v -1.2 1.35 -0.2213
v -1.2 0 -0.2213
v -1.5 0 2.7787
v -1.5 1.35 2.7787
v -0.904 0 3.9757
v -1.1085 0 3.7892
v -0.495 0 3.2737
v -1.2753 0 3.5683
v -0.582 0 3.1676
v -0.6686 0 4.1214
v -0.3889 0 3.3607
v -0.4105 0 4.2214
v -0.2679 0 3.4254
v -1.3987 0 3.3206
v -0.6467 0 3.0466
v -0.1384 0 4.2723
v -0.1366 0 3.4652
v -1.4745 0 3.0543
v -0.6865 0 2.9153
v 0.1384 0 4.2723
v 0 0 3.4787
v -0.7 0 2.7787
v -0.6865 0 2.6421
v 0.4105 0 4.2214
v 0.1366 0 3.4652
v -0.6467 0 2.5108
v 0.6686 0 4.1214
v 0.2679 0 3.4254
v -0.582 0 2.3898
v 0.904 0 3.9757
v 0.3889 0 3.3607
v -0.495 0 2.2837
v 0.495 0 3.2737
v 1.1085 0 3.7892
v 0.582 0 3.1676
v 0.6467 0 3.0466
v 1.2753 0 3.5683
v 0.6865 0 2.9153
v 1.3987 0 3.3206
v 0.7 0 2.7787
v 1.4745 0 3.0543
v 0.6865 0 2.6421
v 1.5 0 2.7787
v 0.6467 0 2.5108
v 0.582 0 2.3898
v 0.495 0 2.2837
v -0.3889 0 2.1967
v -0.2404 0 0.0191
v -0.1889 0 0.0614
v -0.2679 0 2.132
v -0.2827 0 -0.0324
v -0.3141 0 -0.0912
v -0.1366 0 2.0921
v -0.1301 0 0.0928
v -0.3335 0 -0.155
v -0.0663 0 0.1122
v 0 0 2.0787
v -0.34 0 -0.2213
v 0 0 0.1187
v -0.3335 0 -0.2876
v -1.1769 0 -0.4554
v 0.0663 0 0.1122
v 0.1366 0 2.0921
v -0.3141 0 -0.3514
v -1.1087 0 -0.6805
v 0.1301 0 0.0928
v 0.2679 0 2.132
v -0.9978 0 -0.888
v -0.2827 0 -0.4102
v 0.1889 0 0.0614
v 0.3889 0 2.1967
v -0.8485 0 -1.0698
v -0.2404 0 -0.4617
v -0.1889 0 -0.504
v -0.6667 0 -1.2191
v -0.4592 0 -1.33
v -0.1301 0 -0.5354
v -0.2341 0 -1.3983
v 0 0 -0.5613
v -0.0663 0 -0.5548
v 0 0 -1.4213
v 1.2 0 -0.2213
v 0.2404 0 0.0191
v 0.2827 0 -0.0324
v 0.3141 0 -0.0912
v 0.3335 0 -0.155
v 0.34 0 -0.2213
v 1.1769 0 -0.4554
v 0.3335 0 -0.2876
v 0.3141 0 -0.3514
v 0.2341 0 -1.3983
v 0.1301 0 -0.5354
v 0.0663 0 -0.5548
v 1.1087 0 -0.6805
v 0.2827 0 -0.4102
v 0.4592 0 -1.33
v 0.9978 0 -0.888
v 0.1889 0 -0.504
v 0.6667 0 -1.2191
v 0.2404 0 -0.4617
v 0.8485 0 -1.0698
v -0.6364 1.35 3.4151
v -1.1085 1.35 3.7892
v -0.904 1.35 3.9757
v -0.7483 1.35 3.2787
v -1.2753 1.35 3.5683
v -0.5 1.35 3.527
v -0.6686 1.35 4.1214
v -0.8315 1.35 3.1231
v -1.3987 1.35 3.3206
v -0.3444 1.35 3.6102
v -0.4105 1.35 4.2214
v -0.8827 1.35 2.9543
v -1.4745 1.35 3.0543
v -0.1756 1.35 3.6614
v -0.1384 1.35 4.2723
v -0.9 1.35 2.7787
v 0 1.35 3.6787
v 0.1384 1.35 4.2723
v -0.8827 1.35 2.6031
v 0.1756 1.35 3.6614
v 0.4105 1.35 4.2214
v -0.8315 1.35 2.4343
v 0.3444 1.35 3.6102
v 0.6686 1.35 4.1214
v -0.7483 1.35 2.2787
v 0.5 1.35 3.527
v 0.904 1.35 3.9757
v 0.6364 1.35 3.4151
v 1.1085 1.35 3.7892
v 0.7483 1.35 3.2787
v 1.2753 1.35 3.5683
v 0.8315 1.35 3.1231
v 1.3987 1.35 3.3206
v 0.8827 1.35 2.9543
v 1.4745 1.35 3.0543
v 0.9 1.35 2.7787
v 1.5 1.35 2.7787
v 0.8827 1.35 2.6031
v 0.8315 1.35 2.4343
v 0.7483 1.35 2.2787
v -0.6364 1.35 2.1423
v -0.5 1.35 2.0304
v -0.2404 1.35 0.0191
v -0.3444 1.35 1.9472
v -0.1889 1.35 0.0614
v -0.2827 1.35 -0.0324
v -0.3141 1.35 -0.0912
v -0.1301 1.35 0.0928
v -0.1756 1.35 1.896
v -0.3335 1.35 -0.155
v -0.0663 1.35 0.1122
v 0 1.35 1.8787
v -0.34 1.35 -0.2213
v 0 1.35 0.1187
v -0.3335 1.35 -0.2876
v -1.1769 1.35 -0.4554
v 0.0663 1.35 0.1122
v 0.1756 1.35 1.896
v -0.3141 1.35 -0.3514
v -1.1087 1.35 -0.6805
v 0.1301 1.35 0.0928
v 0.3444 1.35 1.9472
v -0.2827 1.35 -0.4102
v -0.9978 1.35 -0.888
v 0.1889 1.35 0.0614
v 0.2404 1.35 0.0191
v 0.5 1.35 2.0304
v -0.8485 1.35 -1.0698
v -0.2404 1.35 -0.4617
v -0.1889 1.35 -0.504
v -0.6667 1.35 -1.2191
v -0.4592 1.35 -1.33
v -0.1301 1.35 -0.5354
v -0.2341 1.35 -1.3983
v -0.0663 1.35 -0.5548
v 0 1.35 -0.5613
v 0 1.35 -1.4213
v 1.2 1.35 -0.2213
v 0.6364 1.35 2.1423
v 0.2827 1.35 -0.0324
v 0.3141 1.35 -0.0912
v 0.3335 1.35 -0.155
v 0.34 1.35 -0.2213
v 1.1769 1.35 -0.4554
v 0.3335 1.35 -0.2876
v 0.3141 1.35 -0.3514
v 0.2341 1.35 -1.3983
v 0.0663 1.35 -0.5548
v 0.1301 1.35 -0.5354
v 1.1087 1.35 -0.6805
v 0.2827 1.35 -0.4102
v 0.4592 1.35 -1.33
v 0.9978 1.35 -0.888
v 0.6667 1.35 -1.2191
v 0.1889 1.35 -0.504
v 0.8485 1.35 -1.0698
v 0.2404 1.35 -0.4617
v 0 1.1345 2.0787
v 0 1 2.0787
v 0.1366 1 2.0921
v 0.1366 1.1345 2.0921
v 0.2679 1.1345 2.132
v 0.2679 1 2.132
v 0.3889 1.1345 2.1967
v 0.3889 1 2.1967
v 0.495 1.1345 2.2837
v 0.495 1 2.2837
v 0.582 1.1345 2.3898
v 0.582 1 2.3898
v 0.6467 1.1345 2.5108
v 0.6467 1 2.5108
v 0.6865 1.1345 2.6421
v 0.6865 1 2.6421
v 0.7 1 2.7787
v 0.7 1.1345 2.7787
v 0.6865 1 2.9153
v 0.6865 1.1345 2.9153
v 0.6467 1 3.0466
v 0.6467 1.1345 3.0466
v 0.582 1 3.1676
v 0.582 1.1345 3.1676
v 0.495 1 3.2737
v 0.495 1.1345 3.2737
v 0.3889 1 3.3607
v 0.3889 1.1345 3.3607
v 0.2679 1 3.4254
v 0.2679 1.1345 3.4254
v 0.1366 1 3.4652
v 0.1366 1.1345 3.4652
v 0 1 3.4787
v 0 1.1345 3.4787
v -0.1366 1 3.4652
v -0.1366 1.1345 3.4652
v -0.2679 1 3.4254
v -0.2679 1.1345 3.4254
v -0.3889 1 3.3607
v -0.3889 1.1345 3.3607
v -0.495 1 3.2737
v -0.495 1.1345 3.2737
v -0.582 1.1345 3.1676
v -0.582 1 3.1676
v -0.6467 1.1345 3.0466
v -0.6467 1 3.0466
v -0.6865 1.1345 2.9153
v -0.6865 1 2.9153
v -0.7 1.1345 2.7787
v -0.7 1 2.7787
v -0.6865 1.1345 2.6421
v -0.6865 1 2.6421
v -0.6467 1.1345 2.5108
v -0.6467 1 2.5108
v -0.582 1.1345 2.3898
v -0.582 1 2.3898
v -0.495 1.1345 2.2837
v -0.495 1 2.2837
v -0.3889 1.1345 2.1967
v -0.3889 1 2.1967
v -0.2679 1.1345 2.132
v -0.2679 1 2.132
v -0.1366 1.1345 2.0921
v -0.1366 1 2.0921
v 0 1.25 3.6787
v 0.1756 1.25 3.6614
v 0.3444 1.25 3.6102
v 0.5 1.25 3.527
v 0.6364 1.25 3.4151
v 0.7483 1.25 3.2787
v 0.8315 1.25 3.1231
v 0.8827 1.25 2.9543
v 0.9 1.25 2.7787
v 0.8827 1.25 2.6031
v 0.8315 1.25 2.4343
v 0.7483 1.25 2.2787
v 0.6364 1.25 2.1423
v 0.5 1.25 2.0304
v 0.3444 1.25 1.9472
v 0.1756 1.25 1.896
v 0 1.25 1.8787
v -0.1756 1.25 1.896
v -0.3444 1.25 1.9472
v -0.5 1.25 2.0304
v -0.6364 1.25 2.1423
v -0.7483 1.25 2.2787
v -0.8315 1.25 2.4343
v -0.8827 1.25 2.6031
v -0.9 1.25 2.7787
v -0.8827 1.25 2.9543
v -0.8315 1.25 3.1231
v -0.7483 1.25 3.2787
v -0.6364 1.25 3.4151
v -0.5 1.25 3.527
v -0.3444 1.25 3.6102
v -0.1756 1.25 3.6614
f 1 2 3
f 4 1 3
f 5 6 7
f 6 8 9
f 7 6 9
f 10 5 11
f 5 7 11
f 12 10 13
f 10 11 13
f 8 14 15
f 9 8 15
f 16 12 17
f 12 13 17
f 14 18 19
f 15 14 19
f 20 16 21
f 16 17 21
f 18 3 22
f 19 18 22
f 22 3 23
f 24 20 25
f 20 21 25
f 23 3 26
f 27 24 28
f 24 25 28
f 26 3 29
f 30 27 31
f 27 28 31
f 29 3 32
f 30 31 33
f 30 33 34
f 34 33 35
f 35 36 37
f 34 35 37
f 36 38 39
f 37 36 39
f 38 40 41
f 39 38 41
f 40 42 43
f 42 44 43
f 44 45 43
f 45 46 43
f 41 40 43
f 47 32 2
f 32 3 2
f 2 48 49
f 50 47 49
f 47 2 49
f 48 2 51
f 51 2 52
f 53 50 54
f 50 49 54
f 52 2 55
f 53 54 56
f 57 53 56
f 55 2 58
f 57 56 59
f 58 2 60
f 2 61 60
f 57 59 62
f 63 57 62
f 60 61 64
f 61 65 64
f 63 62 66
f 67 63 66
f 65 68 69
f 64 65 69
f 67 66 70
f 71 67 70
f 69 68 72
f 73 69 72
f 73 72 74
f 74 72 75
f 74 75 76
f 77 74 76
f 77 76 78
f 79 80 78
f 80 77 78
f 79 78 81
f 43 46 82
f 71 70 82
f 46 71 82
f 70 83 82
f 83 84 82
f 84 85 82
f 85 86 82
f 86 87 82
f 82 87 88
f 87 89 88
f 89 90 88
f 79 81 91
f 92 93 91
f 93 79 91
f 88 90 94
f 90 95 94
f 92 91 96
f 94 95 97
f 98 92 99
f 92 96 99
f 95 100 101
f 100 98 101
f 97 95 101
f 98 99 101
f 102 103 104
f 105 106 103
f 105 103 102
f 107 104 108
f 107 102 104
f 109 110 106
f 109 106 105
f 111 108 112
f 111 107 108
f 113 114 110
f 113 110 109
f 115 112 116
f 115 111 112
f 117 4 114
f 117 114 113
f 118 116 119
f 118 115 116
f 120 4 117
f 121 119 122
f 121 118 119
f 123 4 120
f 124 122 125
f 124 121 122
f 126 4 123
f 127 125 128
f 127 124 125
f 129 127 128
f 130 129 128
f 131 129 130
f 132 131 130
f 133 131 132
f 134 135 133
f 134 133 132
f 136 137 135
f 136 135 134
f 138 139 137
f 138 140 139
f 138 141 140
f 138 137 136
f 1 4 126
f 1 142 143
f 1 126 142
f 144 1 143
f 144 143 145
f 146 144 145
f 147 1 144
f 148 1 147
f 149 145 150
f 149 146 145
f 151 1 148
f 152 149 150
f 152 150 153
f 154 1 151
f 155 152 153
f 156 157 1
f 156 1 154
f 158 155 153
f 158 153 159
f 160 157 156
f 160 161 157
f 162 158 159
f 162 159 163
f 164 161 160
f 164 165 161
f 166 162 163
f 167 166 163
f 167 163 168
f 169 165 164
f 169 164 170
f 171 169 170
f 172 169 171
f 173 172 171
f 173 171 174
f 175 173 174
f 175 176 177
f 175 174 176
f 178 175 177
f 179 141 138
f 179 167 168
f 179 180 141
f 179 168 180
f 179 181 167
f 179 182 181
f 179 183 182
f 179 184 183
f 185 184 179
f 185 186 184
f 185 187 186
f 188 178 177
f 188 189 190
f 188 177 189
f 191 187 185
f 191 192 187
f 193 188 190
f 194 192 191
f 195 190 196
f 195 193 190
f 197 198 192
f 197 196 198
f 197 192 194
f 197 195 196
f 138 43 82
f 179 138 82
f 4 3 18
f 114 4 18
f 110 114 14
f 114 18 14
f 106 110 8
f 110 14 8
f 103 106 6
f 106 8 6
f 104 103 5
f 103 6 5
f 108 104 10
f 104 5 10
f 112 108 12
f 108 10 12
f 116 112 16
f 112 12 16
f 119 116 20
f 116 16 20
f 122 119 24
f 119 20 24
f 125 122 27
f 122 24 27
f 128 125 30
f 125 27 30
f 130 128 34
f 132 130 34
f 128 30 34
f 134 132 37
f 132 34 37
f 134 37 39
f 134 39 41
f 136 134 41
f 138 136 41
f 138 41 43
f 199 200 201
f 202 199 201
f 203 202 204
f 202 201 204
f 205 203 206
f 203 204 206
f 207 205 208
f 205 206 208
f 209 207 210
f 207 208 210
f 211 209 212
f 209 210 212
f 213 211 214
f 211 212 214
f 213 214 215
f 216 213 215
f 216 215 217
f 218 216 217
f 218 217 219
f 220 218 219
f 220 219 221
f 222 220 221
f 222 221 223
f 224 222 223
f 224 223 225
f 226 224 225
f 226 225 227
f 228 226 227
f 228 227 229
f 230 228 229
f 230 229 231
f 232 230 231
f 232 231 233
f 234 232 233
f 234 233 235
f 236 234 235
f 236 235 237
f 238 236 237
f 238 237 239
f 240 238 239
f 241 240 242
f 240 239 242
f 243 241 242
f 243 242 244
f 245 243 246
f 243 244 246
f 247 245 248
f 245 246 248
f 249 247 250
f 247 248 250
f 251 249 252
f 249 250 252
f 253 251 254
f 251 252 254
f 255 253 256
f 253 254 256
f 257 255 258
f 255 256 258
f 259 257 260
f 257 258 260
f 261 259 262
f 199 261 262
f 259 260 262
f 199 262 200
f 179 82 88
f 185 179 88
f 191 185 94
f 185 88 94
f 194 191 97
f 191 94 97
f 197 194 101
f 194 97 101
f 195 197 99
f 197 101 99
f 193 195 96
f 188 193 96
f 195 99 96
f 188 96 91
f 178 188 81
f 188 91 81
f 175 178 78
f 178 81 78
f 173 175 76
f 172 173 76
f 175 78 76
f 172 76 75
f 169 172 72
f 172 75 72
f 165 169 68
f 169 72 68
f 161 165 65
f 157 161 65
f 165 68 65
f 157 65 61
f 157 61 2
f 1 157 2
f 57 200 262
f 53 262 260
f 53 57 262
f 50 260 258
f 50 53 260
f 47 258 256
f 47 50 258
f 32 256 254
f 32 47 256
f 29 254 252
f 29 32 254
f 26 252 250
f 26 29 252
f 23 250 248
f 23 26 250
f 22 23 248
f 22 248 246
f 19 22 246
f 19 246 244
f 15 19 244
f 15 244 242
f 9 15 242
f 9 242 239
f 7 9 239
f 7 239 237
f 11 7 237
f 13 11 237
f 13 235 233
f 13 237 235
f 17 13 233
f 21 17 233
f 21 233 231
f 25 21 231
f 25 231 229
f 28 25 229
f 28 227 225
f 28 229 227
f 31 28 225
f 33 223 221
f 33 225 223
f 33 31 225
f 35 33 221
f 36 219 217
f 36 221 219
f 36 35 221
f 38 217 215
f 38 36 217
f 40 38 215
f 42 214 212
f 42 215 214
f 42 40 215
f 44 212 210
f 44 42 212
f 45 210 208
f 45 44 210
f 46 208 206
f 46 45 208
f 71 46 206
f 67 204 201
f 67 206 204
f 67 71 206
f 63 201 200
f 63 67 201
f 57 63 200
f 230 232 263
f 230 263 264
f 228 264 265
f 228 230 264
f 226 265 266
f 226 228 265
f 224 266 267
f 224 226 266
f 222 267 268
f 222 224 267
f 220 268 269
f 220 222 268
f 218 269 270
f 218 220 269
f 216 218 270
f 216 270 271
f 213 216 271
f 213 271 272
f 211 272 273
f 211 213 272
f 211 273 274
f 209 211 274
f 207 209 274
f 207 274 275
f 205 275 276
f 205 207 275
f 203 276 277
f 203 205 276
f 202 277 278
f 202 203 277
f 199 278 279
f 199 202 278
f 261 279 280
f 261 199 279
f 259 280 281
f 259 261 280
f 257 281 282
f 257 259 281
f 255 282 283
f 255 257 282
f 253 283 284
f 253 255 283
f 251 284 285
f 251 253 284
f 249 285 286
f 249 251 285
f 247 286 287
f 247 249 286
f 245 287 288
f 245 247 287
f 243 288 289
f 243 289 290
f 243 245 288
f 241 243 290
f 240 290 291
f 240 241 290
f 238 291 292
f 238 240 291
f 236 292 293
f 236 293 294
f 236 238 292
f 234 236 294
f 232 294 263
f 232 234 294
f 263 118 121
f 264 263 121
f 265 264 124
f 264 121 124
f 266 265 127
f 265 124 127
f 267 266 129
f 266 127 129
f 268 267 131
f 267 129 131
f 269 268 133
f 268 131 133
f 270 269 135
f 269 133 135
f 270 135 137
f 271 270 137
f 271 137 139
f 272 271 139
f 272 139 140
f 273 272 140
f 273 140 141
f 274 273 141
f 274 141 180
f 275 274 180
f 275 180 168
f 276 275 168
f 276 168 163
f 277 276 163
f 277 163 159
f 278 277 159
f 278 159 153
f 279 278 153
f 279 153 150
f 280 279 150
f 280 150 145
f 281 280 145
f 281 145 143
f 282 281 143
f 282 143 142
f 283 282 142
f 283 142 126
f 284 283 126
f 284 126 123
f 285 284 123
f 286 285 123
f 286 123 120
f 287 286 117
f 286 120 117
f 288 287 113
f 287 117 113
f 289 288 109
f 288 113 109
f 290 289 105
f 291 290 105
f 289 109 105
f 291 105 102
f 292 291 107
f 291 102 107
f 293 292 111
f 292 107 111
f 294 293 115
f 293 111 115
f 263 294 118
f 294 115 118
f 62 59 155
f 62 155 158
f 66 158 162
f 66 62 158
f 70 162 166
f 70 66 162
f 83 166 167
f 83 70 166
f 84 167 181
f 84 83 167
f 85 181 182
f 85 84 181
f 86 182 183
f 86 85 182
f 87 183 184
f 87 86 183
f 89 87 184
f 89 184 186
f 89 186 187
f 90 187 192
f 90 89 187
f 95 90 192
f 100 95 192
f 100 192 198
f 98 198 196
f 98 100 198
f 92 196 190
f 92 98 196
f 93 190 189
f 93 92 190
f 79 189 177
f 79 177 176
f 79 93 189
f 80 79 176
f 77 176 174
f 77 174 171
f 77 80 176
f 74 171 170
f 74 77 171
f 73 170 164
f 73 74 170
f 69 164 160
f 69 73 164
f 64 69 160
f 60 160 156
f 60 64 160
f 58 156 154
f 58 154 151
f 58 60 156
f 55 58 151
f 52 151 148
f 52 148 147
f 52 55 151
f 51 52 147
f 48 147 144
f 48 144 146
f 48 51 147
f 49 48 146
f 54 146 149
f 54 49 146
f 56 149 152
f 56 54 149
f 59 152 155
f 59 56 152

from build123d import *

# Parameters (mm, degrees)
SKETCH1_R           = 0.7
SKETCH1_R_2         = 0.34
BOSS_EXTRUDE1_DEPTH = 1.35
SKETCH2_R           = 0.9
CUT_EXTRUDE3_DEPTH  = 0.35
CHAMFER1_SIZE       = 0.25
CHAMFER1_SIZE_2     = 0.433012702


with BuildPart() as part:
    # Sketch1 → Boss-Extrude1 (new body)
    with BuildSketch(Plane(origin=(0, 0, 0), x_dir=(1, 0, 0), z_dir=(0, 1, 0))):
        with BuildLine():
            Line((-1.2, 0.221308643), (-1.5, -2.778691357))
            ThreePointArc((-1.5, -2.778691357), (0, -4.278691357), (1.5, -2.778691357))
            Line((1.5, -2.778691357), (1.2, 0.221308643))
            ThreePointArc((1.2, 0.221308643), (0, 1.421308643), (-1.2, 0.221308643))
        make_face()
        with Locations(Location((0, -2.778691357, 0), (0, 0, 90))):
            Circle(SKETCH1_R, mode=Mode.SUBTRACT)
        with Locations(Location((0, 0.221308643, 0), (0, 0, 270))):
            Circle(SKETCH1_R_2, mode=Mode.SUBTRACT)
    extrude(amount=BOSS_EXTRUDE1_DEPTH)

    # Sketch2 → Cut-Extrude3 (cut)
    with BuildSketch(Plane(origin=(0, 1.35, 0), x_dir=(1, 0, 0), z_dir=(0, 1, 0))):
        with Locations(Location((0, -2.778691357, 0), (0, 0, 270))):
            Circle(SKETCH2_R)
    extrude(amount=-CUT_EXTRUDE3_DEPTH, mode=Mode.SUBTRACT)

    # Chamfer1
    # the kernel refuses this chamfer: 0.433012702, 0.25 mm, written as the material it adds along each edge
    with BuildSketch(Plane(origin=(0, 1, 2.778691357), x_dir=(0, 0, 1), z_dir=(-1, 0, 0))) as chamfer1_piece_1_section:
        Polygon((0.9, CHAMFER1_SIZE), (0.9 - CHAMFER1_SIZE_2, 0), (0.9, 0), align=None)
    chamfer1_piece_1 = revolve(axis=Axis((0, 1, 2.778691357), (0, 1, 0)), mode=Mode.PRIVATE)
    chamfer1_piece_1 = chamfer1_piece_1 - Plane(origin=(0, 1.191367734, 2.778691357), x_dir=(0, 0, -1), z_dir=(0, -1, 0)) * Cylinder(0.7, 4, mode=Mode.PRIVATE)
    add(chamfer1_piece_1)


solid = part.part
